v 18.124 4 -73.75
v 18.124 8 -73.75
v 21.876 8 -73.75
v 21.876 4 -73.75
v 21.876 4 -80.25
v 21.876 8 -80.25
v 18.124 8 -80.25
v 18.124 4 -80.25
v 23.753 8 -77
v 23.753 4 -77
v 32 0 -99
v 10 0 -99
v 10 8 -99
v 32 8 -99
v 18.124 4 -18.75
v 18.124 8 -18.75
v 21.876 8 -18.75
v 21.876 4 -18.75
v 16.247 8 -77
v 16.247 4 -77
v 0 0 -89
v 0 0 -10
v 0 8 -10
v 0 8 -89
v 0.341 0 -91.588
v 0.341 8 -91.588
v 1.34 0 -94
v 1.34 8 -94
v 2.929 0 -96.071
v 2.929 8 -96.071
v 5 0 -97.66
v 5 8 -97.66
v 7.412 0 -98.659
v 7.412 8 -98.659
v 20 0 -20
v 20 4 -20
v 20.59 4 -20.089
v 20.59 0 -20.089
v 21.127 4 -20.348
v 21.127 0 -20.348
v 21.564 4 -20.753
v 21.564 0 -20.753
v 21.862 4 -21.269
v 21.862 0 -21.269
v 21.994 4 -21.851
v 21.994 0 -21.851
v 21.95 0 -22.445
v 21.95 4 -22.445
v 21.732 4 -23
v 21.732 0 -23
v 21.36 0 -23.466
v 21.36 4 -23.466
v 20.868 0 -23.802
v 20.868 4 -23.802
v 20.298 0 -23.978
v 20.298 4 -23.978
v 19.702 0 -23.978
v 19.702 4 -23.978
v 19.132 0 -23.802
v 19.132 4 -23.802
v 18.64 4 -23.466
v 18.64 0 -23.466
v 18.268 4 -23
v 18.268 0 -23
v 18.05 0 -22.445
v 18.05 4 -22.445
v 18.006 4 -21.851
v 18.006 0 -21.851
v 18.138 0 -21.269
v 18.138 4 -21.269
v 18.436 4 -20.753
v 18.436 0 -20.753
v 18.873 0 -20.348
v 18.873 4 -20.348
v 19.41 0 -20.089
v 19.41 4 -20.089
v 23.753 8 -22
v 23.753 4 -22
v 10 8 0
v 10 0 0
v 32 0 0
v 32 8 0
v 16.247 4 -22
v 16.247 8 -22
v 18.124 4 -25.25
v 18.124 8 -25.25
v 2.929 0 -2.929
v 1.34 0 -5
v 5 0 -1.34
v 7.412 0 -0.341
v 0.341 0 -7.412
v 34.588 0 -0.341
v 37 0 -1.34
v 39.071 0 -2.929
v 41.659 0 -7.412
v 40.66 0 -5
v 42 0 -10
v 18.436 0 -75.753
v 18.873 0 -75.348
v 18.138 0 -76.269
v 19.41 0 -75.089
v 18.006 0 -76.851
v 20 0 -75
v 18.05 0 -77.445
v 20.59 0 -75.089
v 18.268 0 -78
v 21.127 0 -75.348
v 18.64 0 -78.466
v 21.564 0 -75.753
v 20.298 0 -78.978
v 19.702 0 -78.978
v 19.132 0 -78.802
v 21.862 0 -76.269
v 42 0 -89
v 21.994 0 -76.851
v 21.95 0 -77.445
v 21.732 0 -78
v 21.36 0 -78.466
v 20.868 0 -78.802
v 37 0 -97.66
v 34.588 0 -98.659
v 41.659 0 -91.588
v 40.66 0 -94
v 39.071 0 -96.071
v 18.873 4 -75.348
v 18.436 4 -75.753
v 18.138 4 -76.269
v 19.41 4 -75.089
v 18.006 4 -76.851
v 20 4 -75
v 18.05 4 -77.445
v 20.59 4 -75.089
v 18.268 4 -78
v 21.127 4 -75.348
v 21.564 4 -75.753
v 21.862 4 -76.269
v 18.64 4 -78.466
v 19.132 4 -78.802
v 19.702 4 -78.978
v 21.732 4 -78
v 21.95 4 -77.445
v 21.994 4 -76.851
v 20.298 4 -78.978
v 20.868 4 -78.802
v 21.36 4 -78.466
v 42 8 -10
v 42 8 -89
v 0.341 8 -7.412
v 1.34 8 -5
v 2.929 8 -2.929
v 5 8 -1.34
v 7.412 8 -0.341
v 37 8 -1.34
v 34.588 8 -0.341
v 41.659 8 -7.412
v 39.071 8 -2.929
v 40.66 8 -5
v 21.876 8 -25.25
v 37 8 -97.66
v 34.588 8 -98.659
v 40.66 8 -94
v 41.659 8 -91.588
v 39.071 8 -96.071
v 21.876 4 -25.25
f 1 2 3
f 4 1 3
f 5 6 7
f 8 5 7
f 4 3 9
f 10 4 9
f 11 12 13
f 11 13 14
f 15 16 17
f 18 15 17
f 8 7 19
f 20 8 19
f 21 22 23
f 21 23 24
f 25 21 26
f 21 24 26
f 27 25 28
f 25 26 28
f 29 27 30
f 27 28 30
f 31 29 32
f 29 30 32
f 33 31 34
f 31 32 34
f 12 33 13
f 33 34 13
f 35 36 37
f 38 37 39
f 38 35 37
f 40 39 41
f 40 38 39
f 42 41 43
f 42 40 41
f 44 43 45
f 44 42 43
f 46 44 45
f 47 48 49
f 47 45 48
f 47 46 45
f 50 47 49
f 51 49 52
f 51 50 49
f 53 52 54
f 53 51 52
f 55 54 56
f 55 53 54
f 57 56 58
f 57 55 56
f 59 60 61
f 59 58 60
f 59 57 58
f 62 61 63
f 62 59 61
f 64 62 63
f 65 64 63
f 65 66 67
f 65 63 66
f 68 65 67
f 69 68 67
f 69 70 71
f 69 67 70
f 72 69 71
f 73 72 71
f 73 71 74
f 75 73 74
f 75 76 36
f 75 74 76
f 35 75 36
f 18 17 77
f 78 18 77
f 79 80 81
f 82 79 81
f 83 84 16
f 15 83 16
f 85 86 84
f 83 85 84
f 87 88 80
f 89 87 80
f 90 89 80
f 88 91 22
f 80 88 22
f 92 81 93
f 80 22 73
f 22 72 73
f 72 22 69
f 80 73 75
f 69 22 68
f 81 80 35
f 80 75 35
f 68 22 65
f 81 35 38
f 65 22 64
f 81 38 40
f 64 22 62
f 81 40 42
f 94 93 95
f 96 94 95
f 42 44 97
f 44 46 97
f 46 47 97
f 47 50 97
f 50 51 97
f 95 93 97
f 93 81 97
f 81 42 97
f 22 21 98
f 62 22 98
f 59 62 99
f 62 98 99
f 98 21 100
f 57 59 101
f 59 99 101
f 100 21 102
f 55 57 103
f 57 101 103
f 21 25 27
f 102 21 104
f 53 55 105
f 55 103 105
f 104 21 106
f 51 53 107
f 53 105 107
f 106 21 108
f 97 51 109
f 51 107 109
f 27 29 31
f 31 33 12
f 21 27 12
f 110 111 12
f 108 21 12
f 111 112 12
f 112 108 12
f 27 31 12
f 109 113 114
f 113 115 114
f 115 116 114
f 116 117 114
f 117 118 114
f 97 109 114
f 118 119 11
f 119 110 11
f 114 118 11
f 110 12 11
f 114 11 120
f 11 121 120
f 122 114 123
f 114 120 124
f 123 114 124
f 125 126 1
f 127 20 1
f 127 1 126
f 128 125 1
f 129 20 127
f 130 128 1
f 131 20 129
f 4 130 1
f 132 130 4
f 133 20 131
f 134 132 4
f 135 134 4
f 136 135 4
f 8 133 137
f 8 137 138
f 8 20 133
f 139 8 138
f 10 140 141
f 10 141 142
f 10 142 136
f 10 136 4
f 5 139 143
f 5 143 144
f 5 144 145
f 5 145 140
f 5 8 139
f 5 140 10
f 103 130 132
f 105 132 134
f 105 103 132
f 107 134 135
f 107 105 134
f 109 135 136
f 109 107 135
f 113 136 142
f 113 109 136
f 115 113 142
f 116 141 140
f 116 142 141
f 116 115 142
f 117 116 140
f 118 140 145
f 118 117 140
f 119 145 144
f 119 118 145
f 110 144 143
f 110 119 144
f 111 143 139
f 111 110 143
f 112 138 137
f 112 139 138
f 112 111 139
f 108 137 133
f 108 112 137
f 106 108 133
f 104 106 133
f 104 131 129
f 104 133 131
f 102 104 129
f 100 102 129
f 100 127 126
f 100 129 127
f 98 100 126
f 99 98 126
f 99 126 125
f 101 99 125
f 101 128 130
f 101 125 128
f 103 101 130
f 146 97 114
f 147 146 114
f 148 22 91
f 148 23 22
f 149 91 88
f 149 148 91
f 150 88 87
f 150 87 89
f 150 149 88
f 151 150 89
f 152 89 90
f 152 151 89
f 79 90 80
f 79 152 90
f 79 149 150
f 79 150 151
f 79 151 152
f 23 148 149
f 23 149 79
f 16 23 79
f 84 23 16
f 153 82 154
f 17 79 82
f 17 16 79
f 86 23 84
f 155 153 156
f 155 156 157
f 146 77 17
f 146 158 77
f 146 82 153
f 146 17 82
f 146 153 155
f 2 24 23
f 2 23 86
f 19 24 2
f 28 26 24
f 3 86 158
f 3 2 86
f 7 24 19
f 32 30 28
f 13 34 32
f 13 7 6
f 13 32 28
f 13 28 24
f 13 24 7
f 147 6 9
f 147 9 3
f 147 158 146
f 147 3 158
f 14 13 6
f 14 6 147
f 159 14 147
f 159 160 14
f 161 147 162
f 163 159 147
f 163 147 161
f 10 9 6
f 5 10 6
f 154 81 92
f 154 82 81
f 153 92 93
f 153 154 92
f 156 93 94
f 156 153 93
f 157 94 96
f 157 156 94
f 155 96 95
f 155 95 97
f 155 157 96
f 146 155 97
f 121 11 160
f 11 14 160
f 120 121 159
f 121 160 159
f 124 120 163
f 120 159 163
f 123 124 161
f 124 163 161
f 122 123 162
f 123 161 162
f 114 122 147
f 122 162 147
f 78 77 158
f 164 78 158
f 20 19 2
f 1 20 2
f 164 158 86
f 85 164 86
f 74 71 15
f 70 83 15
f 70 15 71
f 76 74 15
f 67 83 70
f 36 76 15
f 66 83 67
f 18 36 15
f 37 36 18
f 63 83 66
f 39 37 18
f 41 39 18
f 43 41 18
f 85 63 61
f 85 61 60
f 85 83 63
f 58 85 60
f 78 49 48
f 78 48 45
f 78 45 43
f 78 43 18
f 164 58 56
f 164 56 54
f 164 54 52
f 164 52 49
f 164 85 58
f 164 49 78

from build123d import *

# Parameters (mm, degrees)
SKETCH1_W           = 42
SKETCH1_H           = 99
SKETCH1_R           = 2
BOSS_EXTRUDE1_DEPTH = 8
CUT_EXTRUDE1_DEPTH  = 4
FILLET1_R           = 10


with BuildPart() as part:
    # Sketch1 → Boss-Extrude1 (new body)
    with BuildSketch(Plane(origin=(0, 0, 0), x_dir=(1, 0, 0), z_dir=(0, 1, 0))):
        with Locations((21, 49.5)):
            Rectangle(SKETCH1_W, SKETCH1_H)
        with Locations(Location((20, 77, 0), (0, 0, 270))):
            Circle(SKETCH1_R, mode=Mode.SUBTRACT)
        with Locations(Location((20, 22, 0), (0, 0, 270))):
            Circle(SKETCH1_R, mode=Mode.SUBTRACT)
    extrude(amount=BOSS_EXTRUDE1_DEPTH)

    # Sketch2 → Cut-Extrude1 (cut)
    with BuildSketch(Plane(origin=(0, 8, 0), x_dir=(1, 0, 0), z_dir=(0, 1, 0))):
        Polygon((21.876388375, 80.25), (18.123611625, 80.25), (16.24722325, 77), (18.123611625, 73.75), (21.876388375, 73.75), (23.75277675, 77), align=None)
        Polygon((21.876388375, 18.75), (23.75277675, 22), (21.876388375, 25.25), (18.123611625, 25.25), (16.24722325, 22), (18.123611625, 18.75), align=None)
    extrude(amount=-CUT_EXTRUDE1_DEPTH, mode=Mode.SUBTRACT)

    # Fillet1
    fillet1_edges = [part.edges().sort_by_distance(p)[0] for p in [
        (0, 4, 0),
        (0, 4, -99),
        (42, 4, -99),
        (42, 4, 0),
    ]]
    fillet(fillet1_edges, radius=FILLET1_R)


solid = part.part
